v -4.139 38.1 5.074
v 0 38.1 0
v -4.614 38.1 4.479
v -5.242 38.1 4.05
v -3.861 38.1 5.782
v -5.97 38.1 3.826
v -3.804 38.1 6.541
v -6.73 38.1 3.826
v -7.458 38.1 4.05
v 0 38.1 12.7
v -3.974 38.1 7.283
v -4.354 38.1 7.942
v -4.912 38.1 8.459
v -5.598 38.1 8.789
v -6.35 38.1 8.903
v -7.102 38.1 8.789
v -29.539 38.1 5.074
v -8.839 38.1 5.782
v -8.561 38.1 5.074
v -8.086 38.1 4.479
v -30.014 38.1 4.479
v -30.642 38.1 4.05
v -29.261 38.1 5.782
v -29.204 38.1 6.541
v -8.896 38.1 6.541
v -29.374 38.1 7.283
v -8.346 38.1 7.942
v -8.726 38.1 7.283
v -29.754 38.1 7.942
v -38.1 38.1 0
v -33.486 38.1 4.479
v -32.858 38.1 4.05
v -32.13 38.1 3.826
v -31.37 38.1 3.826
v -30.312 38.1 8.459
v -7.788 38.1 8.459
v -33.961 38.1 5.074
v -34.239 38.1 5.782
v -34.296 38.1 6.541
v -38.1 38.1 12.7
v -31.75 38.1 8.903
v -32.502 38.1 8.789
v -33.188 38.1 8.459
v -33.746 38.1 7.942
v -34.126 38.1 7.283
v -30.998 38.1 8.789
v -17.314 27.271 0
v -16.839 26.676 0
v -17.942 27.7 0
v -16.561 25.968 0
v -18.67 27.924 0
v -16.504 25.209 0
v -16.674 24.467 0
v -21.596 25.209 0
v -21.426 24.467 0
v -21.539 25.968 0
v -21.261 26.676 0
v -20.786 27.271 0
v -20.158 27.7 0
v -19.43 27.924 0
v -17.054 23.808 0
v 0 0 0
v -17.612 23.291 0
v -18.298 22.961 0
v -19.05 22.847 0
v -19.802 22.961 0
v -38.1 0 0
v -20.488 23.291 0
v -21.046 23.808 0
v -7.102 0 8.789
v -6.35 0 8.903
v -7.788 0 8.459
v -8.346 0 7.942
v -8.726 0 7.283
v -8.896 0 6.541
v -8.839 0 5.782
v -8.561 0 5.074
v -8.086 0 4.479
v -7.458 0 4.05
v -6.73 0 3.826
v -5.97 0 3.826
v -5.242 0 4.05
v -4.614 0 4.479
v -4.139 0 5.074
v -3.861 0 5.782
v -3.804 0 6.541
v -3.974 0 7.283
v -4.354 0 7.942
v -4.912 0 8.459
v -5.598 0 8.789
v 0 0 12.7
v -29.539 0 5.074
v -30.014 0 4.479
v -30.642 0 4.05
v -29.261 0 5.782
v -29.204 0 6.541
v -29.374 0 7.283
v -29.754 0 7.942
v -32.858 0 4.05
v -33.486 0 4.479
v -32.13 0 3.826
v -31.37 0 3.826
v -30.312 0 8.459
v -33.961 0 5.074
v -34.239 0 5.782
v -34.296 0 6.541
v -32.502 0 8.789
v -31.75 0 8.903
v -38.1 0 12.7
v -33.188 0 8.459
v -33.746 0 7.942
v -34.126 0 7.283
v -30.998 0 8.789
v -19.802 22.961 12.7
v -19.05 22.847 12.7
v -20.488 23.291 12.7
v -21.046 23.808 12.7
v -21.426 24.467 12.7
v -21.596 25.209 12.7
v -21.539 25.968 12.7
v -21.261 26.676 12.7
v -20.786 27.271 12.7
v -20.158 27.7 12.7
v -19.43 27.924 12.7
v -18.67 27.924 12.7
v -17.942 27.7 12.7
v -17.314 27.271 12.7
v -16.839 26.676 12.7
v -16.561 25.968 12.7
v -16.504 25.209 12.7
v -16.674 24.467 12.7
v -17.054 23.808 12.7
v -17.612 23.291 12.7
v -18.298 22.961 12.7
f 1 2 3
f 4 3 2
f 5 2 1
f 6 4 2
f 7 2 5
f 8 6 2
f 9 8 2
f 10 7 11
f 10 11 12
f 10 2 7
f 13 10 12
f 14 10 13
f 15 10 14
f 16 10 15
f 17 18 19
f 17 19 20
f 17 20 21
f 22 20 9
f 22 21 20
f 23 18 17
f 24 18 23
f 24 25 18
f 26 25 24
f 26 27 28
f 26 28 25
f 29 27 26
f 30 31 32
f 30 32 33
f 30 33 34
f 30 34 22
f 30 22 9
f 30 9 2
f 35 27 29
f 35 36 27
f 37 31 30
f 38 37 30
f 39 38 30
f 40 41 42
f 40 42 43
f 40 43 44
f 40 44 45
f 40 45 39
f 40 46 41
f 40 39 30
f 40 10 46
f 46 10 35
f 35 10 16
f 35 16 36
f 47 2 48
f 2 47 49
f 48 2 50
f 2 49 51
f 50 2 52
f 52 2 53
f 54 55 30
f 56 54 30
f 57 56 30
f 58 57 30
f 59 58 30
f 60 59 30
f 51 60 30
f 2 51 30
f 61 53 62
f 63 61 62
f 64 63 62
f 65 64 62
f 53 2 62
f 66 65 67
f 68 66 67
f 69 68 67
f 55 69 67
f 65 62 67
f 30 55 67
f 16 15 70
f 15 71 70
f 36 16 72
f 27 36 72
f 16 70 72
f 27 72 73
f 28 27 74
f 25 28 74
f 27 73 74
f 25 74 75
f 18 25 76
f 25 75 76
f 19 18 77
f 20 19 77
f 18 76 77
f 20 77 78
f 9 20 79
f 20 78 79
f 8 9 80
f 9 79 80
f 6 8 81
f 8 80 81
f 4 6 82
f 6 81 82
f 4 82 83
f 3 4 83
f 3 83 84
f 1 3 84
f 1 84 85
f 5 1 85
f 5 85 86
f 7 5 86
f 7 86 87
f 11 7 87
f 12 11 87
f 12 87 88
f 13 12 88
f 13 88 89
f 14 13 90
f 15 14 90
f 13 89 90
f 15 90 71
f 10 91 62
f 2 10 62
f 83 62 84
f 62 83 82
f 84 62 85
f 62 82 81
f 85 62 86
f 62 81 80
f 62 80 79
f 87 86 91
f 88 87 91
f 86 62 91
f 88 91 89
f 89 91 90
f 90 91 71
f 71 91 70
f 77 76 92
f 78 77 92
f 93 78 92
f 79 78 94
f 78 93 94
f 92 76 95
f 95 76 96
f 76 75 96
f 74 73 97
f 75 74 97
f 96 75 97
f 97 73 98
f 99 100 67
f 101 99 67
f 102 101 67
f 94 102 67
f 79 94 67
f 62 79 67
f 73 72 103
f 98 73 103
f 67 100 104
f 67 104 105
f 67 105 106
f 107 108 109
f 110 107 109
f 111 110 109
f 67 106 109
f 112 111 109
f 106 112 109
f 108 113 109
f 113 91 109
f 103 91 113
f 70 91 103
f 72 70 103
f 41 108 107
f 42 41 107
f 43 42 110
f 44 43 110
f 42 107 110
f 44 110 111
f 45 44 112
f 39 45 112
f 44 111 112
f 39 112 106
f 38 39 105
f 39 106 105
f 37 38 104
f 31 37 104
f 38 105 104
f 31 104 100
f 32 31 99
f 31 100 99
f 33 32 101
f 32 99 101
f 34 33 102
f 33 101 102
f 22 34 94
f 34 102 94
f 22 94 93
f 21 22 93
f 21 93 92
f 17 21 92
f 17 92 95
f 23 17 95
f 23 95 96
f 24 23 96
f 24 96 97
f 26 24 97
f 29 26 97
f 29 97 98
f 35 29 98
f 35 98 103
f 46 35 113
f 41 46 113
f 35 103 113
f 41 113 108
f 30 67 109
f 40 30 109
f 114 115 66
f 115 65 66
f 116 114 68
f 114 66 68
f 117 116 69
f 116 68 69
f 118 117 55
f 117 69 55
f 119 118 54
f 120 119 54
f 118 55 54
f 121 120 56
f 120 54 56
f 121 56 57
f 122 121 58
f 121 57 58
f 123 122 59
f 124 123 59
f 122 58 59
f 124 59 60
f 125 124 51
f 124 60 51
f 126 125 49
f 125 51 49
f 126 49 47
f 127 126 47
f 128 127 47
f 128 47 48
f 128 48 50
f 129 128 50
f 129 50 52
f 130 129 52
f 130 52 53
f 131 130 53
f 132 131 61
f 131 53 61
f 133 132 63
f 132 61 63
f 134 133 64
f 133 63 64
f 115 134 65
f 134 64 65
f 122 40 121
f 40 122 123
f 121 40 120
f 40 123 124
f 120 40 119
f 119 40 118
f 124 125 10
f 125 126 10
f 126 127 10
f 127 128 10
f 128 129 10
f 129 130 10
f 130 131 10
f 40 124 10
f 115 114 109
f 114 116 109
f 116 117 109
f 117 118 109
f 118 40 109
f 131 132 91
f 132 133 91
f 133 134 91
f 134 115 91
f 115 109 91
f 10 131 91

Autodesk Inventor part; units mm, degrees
ref_plane "YZ Plane" through (0, 0, 0) normal (1, 0, 0) x (0, 1, 0)
ref_plane "XZ Plane" through (0, 0, 0) normal (0, 1, 0) x (-1, 0, 0)
ref_plane "XY Plane" through (0, 0, 0) normal (0, 0, 1) x (1, 0, 0)
sketch "Sketch1" plane through (0, 0, 0) normal (0, 1, 0) x (-1, 0, 0)
  line L0 (0, 0) -> (38.1, 0)
  line L1 (38.1, 0) -> (38.1, 12.7)
  line L2 (38.1, 12.7) -> (0, 12.7)
  line L3 (0, 12.7) -> (0, 0)
  dimension "d0" = 38.1
  dimension "d1" = 12.7
extrude "Extrusion1" add sketch "Sketch1" along normal blind 38.1
sketch "Sketch2" plane through (0, 38.1, 0) normal (0, 1, 0) x (1, 0, 0)
  line L0 (0, 0) -> (-38.1, 0) projected
  line L1 (-38.1, -12.7) -> (0, -12.7) projected
  line L2 (-19.05, 0) -> (-19.05, -12.7) construction
  circle A0 centre (-31.75, -6.35) radius 3.7798
  circle A1 centre (-6.35, -6.35) radius 3.7798
  dimension "d4" = 12.7
hole "Hole1" at (-31.75, 38.1, 6.35) at (-6.35, 38.1, 6.35) direction (0, -1, 0) diameter 5.1054 end through all clearance for "Flat Head Machine Screw (82)" size "#10" standard "Ansi Unified Screw Threads"
sketch "Sketch3" plane through (-38.1, 0, 12.7) normal (0, 0, 1) x (1, 0, 0)
  line L0 (0, 38.1) -> (38.1, 38.1) projected
  circle A0 centre (19.05, 25.4) radius 3.652
  dimension "d12" = 12.7
hole "Hole2" at (-19.05, 25.4, 12.7) direction (0, 0, -1) diameter 5.1054 end through all clearance for "Flat Head Machine Screw (82)" size "#10" standard "Ansi Unified Screw Threads"
properties part number "hubjig_tab" material "Wood (Cherry)"
